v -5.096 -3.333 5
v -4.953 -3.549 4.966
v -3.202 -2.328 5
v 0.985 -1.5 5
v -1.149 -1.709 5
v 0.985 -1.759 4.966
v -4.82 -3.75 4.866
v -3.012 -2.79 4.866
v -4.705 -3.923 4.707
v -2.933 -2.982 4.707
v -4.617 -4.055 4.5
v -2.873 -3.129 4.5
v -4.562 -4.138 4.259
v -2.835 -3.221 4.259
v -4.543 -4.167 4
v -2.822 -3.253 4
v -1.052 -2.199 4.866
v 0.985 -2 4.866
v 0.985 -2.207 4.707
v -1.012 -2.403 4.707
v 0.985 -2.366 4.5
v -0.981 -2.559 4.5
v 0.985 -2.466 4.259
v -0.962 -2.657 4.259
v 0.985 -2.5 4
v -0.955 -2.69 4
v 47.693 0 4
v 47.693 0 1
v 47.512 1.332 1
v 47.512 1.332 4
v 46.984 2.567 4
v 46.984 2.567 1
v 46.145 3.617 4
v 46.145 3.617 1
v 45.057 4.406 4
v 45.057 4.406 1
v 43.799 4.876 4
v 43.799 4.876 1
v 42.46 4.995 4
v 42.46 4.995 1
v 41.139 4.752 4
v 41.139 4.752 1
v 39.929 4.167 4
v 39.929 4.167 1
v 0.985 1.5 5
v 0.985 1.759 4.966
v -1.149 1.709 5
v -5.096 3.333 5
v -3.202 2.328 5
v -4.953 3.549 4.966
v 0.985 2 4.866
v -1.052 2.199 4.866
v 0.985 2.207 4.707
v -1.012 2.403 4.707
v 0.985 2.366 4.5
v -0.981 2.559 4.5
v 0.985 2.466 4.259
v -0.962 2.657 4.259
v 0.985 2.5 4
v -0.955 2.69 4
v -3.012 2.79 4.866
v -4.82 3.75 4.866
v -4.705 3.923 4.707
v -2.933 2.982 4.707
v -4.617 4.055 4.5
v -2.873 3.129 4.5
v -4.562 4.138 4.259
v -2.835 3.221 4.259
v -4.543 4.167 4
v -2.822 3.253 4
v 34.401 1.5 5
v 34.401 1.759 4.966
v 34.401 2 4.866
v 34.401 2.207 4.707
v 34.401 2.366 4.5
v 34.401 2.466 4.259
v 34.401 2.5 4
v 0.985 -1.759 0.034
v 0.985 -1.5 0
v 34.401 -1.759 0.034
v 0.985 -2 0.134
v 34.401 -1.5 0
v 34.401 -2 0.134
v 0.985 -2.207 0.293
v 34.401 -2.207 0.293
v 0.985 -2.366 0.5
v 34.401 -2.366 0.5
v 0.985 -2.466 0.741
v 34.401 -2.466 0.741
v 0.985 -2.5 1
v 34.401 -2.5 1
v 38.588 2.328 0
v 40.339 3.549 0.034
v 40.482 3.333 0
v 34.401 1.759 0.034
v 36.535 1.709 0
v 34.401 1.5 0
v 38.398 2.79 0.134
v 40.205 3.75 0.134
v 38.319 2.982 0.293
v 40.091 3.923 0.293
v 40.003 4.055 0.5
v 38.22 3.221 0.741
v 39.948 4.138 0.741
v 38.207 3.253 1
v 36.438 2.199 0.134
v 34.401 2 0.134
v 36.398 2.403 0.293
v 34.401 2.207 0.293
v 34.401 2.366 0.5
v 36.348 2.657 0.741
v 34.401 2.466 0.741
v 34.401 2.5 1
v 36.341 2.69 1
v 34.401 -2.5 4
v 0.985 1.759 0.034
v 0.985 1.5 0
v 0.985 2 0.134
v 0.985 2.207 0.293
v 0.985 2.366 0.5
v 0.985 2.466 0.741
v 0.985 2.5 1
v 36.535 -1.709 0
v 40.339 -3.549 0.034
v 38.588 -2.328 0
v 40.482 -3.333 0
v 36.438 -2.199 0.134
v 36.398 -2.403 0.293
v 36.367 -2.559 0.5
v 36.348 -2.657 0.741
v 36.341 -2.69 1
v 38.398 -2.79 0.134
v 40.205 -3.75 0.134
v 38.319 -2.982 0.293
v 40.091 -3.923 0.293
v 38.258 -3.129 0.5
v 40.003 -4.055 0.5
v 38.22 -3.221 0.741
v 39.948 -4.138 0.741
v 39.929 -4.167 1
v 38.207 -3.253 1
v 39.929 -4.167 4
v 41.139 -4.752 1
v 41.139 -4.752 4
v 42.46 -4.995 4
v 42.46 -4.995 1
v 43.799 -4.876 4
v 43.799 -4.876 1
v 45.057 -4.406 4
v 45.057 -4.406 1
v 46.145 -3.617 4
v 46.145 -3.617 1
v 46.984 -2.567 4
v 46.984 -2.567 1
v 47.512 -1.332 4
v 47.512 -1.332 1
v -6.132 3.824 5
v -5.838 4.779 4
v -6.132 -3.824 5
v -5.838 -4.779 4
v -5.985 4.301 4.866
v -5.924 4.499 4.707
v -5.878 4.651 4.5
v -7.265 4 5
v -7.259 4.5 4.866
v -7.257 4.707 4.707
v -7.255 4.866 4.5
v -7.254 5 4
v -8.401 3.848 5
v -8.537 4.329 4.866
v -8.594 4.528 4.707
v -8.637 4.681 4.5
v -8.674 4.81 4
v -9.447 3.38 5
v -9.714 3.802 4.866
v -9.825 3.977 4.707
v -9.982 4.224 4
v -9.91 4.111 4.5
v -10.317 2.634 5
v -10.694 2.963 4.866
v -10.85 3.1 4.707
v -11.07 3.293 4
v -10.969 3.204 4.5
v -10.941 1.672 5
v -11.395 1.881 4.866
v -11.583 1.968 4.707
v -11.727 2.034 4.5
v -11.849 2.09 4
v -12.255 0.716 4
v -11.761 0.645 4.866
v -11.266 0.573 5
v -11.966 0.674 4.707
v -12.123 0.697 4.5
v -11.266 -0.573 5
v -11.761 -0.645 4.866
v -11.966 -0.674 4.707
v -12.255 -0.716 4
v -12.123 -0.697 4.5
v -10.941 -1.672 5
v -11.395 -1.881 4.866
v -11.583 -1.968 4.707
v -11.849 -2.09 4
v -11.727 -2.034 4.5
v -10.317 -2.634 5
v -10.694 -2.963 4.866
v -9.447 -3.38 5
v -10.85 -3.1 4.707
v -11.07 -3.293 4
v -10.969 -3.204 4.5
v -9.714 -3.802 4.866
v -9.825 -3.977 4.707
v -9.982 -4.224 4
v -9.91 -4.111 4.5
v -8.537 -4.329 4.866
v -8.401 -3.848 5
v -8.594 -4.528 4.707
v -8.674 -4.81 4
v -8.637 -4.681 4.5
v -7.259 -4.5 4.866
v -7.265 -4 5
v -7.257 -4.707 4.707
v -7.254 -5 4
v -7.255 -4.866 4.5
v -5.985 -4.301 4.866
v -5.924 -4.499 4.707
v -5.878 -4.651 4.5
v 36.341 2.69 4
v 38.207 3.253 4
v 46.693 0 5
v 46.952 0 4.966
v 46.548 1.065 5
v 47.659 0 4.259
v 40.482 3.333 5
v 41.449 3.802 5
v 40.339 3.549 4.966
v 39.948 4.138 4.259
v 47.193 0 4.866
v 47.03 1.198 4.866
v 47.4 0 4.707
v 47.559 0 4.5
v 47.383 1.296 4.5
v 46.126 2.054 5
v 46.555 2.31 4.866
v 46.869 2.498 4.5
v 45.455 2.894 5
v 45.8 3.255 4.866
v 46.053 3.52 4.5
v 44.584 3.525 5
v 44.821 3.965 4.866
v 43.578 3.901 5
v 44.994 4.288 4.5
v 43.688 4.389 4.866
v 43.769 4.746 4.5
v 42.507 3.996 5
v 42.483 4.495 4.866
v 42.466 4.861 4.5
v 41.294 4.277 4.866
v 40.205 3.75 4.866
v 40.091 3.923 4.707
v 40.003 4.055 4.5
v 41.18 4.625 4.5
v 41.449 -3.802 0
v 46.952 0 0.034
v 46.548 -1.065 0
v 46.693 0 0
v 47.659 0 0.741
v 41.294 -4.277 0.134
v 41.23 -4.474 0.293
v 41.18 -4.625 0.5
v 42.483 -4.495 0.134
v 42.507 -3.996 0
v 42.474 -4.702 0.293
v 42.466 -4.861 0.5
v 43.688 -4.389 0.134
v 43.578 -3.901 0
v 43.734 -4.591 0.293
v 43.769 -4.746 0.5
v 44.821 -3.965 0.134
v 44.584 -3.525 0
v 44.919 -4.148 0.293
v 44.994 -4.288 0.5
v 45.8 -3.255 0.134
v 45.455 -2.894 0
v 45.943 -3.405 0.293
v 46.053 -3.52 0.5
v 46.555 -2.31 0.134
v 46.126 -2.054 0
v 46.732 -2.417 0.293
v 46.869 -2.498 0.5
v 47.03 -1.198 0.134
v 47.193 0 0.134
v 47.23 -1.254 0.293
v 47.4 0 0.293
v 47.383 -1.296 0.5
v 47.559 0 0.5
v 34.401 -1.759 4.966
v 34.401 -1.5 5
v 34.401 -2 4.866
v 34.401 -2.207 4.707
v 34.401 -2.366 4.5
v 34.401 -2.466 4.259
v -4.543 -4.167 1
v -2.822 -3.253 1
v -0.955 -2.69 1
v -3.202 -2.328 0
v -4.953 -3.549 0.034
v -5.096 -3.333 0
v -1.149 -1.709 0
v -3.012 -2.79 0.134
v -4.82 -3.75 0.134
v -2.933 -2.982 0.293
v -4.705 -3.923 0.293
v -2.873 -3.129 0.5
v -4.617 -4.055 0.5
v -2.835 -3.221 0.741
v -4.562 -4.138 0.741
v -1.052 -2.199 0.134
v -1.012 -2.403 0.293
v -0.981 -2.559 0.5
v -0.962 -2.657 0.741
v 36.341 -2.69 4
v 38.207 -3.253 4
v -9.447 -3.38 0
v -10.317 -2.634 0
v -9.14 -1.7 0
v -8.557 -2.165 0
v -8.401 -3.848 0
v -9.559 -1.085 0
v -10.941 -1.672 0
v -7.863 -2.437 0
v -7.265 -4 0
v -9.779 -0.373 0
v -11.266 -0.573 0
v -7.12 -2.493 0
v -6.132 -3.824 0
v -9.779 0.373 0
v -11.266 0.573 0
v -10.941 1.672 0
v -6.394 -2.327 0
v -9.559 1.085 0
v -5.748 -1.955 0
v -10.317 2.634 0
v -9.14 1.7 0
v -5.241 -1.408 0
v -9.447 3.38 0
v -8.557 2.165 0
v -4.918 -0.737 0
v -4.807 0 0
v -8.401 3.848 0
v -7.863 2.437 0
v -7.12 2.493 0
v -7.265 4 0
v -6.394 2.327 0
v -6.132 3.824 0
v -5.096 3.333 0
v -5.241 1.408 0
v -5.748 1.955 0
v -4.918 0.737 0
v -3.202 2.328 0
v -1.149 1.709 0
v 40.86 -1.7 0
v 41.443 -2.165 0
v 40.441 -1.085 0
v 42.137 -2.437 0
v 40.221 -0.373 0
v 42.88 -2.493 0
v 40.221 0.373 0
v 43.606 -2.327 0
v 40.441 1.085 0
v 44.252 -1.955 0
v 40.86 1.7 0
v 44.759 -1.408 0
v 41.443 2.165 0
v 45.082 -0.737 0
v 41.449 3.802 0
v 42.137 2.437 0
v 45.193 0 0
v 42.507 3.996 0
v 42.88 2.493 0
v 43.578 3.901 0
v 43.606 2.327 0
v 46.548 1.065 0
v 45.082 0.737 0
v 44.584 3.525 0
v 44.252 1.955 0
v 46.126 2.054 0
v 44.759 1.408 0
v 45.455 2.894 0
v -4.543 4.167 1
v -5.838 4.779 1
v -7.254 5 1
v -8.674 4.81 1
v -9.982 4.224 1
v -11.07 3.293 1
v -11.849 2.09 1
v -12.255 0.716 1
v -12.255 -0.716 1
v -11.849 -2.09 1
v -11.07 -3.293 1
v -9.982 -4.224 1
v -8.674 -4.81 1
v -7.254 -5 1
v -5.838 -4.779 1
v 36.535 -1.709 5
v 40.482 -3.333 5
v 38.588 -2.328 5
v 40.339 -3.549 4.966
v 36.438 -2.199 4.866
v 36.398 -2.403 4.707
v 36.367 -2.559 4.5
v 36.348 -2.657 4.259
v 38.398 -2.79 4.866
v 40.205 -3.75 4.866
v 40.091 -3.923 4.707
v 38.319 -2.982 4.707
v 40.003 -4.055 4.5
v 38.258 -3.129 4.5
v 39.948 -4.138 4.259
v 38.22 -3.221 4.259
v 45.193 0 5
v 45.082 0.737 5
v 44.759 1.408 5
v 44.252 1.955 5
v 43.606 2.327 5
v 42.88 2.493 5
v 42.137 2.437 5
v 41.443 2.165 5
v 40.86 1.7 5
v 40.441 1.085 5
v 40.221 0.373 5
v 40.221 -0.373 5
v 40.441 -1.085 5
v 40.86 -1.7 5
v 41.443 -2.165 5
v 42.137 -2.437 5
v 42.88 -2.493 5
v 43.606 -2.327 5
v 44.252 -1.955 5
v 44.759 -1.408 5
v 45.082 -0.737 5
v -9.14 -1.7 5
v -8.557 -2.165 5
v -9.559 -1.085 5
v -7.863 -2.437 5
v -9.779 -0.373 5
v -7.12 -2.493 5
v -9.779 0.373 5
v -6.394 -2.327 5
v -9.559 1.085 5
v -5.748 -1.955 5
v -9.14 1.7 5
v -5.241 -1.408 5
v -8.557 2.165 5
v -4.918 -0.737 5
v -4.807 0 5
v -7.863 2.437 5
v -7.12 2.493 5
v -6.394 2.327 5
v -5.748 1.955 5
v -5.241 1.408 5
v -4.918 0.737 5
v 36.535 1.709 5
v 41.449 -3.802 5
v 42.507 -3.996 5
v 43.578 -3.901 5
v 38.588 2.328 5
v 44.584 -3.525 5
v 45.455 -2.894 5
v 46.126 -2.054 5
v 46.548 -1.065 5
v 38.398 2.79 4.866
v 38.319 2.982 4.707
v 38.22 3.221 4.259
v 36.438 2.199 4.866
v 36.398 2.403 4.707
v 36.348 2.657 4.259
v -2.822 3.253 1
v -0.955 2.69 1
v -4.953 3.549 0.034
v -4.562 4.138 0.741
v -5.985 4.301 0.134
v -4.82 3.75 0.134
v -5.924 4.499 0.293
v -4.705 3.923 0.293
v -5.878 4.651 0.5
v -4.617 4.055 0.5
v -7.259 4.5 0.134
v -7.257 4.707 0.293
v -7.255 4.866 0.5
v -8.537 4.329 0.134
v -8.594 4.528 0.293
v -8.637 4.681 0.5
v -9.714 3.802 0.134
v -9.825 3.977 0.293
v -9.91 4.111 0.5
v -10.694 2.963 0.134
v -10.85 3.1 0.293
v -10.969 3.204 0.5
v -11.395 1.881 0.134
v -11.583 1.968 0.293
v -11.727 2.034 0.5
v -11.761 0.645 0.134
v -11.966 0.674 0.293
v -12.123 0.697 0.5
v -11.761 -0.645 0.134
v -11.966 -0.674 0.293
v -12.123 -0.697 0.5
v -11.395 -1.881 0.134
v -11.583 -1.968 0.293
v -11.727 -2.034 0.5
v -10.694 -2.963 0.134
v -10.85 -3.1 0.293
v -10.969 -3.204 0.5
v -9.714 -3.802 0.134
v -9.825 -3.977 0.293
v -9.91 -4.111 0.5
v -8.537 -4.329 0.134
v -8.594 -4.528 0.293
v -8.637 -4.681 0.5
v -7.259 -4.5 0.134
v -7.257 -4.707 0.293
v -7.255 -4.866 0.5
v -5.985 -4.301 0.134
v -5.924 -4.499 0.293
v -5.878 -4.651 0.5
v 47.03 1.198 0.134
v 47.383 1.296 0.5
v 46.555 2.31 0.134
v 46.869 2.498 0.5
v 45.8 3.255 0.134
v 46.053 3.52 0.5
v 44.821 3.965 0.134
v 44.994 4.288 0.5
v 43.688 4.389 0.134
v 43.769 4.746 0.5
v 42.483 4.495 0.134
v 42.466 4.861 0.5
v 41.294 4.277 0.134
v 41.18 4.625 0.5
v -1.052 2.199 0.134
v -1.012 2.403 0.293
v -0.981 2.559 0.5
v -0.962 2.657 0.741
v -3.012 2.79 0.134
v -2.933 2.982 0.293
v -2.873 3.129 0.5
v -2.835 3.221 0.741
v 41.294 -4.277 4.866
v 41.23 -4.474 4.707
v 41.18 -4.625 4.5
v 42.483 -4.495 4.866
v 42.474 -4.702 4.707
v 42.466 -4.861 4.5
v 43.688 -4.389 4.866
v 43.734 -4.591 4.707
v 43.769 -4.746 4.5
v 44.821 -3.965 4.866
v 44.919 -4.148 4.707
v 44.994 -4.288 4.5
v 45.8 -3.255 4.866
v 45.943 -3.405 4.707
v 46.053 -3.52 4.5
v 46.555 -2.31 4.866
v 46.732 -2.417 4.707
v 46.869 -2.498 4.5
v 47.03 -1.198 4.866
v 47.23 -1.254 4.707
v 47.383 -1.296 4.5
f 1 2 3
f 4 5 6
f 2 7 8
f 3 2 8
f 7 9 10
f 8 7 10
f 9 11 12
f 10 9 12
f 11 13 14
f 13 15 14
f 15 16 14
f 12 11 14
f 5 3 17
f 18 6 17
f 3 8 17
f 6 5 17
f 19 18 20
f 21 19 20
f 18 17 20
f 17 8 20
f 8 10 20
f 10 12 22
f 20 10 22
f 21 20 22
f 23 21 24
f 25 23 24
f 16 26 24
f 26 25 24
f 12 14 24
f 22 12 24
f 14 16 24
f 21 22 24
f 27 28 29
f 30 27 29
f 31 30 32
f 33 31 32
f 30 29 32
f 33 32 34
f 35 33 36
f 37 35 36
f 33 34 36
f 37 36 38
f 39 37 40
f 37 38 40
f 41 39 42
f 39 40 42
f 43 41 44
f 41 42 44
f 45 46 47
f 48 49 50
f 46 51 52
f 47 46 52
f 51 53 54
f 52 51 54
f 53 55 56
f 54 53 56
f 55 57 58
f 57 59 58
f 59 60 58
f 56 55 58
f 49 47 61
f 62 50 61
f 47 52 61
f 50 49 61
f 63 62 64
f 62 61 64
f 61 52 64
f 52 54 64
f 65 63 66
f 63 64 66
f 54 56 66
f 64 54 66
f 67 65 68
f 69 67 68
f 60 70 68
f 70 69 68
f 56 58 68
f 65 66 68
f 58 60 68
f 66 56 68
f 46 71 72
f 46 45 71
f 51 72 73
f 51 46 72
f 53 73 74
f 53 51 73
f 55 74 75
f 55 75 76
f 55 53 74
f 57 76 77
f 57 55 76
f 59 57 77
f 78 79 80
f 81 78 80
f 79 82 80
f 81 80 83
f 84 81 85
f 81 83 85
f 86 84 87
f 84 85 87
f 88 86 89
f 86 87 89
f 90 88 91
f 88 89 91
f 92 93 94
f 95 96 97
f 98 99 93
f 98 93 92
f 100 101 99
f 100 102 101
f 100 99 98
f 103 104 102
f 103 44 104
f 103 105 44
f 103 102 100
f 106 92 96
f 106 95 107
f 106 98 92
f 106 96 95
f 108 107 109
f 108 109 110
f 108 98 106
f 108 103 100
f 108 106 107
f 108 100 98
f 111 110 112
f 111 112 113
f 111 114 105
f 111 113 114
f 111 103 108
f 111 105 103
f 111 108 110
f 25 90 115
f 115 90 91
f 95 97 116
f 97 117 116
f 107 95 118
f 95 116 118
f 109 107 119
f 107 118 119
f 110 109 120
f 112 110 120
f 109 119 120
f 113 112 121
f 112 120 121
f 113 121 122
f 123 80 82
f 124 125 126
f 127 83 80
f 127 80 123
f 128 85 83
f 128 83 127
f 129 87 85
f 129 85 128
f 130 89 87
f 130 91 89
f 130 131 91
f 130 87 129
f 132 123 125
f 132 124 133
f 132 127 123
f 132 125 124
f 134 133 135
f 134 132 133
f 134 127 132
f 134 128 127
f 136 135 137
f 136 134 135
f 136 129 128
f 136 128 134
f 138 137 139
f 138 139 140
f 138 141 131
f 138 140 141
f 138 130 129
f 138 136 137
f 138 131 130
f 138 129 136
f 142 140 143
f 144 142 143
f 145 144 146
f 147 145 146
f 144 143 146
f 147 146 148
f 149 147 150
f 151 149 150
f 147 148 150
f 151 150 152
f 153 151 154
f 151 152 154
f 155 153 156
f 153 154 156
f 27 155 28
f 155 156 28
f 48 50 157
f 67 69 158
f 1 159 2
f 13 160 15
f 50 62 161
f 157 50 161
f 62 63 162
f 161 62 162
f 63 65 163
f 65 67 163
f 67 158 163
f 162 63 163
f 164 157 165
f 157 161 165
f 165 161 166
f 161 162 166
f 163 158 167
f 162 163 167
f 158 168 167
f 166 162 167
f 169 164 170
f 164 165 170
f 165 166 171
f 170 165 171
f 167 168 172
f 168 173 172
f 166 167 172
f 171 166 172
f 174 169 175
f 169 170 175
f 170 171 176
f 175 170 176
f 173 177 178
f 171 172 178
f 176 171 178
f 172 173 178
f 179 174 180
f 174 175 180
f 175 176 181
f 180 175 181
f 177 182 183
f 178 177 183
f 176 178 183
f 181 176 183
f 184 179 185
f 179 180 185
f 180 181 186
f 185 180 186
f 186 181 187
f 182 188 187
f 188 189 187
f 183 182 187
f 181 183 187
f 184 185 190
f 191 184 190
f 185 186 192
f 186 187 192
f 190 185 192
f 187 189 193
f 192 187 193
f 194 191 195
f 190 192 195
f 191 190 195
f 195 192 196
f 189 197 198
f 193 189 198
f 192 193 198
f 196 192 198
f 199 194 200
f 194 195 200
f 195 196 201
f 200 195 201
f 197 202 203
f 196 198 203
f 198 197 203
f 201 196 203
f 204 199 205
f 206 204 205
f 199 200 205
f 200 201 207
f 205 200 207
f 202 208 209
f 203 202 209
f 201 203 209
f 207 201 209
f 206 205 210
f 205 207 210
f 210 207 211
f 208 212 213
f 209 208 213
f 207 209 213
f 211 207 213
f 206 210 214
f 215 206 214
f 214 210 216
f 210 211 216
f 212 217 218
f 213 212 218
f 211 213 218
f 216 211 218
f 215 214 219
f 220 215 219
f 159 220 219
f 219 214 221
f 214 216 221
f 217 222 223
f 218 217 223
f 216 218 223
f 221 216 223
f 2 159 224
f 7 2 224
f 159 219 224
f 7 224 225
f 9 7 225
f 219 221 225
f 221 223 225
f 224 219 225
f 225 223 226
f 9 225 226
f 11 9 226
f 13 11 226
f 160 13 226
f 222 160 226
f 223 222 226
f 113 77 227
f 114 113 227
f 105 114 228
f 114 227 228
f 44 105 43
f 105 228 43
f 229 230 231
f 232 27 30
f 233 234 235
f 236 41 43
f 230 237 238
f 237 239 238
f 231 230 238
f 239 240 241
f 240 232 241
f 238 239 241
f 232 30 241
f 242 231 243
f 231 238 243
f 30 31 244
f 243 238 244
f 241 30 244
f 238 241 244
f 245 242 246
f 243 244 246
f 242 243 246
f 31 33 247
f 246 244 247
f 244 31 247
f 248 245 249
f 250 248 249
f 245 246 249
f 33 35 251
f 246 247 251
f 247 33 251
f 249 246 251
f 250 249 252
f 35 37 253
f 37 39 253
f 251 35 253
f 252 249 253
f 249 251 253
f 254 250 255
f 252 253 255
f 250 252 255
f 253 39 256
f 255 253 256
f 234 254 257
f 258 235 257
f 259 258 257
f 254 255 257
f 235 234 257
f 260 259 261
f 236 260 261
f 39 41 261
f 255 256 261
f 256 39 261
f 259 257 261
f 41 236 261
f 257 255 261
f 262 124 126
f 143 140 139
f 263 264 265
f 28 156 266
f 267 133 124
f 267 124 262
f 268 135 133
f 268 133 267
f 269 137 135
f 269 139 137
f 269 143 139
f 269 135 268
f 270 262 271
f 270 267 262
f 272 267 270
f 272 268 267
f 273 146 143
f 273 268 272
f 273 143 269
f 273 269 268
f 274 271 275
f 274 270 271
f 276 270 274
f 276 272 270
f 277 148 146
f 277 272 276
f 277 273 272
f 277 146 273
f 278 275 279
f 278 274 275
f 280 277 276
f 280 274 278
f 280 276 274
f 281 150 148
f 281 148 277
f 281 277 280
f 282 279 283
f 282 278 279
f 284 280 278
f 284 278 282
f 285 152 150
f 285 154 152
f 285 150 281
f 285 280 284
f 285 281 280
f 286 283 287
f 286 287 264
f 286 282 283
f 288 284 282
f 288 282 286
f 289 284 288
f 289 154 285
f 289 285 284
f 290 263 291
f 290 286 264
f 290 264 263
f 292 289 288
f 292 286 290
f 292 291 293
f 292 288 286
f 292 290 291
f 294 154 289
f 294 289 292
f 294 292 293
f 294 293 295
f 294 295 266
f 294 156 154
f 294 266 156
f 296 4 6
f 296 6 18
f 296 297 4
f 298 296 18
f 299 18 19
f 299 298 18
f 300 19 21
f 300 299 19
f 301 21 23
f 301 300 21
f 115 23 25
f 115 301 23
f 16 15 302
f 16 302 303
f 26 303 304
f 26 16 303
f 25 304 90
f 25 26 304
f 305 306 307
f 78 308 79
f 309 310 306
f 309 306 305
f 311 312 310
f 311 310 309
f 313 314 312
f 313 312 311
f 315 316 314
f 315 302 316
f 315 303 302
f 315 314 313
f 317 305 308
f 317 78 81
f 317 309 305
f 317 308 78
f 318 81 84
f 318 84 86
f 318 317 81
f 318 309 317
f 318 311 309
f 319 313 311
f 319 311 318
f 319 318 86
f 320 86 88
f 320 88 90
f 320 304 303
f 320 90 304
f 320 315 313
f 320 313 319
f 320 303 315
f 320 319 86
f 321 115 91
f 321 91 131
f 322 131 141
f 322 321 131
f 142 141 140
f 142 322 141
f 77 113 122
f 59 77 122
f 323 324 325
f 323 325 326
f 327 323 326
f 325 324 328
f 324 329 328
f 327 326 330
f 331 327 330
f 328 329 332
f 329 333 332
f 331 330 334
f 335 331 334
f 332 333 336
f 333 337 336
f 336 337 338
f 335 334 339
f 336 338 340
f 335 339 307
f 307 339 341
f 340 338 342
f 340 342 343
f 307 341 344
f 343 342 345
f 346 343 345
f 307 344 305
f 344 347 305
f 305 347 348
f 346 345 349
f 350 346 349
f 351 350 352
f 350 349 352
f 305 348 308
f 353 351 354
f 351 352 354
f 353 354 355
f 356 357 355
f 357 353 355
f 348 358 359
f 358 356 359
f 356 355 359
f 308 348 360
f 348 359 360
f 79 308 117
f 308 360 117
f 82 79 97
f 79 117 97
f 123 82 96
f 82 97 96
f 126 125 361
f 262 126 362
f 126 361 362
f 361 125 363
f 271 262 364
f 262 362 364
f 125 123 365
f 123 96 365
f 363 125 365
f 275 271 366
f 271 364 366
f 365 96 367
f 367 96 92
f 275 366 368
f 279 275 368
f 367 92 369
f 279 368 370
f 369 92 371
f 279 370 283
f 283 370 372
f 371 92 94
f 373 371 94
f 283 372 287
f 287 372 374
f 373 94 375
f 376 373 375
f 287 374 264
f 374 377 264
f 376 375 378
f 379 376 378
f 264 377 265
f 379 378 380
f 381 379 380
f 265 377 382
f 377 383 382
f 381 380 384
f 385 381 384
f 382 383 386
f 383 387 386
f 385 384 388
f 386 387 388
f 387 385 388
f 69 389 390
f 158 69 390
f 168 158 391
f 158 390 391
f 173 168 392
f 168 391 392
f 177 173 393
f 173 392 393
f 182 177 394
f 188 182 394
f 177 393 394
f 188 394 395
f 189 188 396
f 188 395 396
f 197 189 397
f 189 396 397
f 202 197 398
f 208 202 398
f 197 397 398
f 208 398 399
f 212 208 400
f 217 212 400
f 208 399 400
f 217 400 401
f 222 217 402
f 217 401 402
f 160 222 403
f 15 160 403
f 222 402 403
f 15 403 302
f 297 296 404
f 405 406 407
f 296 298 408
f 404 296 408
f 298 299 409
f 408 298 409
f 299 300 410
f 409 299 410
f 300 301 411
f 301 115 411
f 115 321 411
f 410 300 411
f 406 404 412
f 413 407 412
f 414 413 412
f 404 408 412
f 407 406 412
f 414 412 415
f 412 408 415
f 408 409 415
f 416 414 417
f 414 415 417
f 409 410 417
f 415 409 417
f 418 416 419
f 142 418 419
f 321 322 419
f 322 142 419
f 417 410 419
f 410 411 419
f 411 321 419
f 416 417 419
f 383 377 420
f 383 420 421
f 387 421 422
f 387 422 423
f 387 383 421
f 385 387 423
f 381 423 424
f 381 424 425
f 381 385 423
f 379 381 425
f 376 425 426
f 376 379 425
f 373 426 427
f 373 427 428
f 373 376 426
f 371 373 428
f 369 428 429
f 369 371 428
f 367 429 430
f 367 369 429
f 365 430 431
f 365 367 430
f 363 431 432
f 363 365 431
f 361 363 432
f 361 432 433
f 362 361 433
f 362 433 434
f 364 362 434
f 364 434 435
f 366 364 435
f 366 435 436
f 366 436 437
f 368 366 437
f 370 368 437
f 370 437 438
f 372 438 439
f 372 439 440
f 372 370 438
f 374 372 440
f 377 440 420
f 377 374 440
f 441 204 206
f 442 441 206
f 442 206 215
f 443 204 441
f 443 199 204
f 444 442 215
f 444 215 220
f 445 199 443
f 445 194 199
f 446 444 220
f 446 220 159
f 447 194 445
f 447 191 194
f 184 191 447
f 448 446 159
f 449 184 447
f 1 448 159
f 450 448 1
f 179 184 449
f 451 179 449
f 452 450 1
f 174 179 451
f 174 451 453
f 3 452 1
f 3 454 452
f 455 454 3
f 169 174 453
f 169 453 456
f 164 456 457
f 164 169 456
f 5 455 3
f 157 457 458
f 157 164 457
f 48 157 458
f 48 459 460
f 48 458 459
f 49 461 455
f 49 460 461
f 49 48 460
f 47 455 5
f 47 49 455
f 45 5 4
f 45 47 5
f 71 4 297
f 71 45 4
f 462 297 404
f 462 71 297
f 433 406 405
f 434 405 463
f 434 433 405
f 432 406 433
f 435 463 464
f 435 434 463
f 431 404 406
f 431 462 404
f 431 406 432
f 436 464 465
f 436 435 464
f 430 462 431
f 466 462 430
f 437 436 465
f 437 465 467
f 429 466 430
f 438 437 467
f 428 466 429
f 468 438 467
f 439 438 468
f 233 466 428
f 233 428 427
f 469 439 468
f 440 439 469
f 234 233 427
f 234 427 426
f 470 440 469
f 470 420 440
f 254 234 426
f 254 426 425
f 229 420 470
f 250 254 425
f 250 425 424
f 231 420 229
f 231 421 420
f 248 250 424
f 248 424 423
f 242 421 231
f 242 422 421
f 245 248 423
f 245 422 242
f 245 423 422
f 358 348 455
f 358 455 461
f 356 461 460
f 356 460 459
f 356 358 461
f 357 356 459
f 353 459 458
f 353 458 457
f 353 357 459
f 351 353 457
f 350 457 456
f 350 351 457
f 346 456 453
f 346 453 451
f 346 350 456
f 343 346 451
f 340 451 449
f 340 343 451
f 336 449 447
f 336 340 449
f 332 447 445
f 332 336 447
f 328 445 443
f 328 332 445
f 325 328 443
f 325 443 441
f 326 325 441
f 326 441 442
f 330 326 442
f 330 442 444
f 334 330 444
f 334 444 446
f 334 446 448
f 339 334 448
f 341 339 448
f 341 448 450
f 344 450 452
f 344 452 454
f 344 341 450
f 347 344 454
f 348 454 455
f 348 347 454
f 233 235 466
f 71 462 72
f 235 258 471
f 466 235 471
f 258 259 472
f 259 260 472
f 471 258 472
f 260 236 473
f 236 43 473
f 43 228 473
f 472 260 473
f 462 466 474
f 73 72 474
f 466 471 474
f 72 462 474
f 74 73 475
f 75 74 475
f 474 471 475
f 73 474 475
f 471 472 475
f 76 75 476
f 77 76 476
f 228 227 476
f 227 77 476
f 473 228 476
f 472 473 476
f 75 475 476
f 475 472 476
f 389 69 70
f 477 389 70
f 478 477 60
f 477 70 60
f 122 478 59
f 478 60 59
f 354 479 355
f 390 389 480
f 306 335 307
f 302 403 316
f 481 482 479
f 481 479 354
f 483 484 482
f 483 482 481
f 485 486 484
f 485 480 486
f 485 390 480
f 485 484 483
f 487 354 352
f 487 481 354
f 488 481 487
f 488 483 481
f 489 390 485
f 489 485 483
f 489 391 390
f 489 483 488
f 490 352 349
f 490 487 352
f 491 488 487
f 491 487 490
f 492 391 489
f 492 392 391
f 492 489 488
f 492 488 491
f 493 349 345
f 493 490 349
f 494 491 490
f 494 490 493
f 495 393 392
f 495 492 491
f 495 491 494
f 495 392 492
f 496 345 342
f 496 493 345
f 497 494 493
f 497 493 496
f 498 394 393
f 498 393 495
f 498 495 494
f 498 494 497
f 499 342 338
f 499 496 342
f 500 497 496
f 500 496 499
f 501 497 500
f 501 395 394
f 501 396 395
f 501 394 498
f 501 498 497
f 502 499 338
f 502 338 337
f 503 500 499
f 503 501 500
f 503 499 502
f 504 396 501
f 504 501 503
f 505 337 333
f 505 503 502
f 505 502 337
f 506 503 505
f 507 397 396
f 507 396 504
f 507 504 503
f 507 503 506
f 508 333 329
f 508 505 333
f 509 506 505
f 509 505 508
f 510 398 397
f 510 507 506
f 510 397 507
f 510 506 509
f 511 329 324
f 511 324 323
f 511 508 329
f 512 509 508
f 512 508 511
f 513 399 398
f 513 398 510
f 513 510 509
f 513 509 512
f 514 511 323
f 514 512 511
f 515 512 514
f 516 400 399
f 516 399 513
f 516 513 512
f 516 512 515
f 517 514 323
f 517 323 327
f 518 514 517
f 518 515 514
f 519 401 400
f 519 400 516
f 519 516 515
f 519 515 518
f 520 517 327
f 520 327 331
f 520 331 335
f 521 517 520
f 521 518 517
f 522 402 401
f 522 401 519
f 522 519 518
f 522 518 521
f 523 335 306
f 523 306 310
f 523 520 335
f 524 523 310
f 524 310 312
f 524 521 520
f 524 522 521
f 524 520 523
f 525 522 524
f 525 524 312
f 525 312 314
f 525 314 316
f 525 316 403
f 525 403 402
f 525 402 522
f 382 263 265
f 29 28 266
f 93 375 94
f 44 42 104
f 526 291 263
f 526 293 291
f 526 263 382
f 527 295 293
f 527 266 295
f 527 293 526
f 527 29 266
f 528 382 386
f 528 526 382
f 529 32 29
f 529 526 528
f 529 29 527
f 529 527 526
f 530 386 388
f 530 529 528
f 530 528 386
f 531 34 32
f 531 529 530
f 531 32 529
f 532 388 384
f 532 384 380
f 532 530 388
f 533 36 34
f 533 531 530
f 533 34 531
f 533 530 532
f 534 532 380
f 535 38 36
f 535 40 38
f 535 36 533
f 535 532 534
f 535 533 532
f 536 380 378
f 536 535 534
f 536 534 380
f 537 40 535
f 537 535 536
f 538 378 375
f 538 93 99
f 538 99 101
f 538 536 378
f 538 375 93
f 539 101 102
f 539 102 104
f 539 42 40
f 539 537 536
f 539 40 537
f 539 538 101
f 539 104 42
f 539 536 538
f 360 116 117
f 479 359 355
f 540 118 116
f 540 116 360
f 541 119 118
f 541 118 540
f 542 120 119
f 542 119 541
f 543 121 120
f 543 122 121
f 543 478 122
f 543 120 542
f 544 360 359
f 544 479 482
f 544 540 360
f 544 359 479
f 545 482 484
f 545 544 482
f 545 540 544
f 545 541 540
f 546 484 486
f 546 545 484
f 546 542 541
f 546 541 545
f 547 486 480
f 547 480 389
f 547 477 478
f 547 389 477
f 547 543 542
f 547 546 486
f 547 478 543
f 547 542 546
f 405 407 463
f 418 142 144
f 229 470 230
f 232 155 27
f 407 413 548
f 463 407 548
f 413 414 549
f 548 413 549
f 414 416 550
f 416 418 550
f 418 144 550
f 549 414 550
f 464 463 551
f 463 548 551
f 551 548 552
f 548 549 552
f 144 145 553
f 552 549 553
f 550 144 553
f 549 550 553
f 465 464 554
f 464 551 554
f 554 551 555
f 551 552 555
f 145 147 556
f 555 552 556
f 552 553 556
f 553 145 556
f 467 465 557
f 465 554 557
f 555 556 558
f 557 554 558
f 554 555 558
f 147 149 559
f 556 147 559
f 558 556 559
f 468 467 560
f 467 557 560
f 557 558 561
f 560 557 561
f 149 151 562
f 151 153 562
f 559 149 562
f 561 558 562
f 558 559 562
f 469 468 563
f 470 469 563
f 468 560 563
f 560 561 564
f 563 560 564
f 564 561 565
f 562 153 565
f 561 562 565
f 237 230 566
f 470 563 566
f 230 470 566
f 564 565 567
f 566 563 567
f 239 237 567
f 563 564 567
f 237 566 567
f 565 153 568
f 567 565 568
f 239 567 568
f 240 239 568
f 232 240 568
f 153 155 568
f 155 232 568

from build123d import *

# Parameters (mm, degrees)
F0_R     = 2.5
F1_DEPTH = 5
F2_R     = 10
F3_R     = 1


with BuildPart() as f1:
    # F0 (on Top) → F1 (new body)
    with BuildSketch(Plane.XY):
        with BuildLine():
            ThreePointArc((-2.3070607836, 0), (-2.4774316521, 1.2940952255), (-2.9769337647, 2.5))
            ThreePointArc((-2.9769337647, 2.5), (-12.3070607836, 0), (-2.9769337647, -2.5))
            ThreePointArc((-2.9769337647, -2.5), (-2.4774316521, -1.2940952255), (-2.3070607836, 0))
        make_face()
        with Locations((-7.3070607836, 0)):
            Circle(F0_R, mode=Mode.SUBTRACT)
        with BuildLine():
            ThreePointArc((38.3628121975, -2.5), (37.6929392164, 0), (38.3628121975, 2.5))
            Line((38.3628121975, 2.5), (-2.9769337647, 2.5))
            ThreePointArc((-2.9769337647, 2.5), (-2.4774316521, 1.2940952255), (-2.3070607836, 0))
            ThreePointArc((-2.3070607836, 0), (-2.4774316521, -1.2940952255), (-2.9769337647, -2.5))
            Line((-2.9769337647, -2.5), (38.3628121975, -2.5))
        make_face()
        with BuildLine():
            ThreePointArc((38.3628121975, -2.5), (43.9870344419, -4.8296291314), (47.6929392164, 0))
            ThreePointArc((47.6929392164, 0), (43.9870344419, 4.8296291314), (38.3628121975, 2.5))
            ThreePointArc((38.3628121975, 2.5), (37.6929392164, 0), (38.3628121975, -2.5))
        make_face()
        with Locations((42.6929392164, 0)):
            Circle(F0_R, mode=Mode.SUBTRACT)
    extrude(amount=F1_DEPTH)

    # F2
    f2_edges = [f1.edges().sort_by_distance(p)[0] for p in [
        (-2.976934, 2.5, 2.5),
        (-2.976934, -2.5, 2.5),
        (38.362812, -2.5, 2.5),
        (38.362812, 2.5, 2.5),
    ]]
    fillet(f2_edges, radius=F2_R)

    # F3
    f3_edges = [f1.edges().sort_by_distance(p)[0] for p in [
        (17.692939, 2.5, 5),
        (-1.90225, 2.925729, 5),
        (17.692939, 2.5, 0),
    ]]
    fillet(f3_edges, radius=F3_R)


solid = f1.part
